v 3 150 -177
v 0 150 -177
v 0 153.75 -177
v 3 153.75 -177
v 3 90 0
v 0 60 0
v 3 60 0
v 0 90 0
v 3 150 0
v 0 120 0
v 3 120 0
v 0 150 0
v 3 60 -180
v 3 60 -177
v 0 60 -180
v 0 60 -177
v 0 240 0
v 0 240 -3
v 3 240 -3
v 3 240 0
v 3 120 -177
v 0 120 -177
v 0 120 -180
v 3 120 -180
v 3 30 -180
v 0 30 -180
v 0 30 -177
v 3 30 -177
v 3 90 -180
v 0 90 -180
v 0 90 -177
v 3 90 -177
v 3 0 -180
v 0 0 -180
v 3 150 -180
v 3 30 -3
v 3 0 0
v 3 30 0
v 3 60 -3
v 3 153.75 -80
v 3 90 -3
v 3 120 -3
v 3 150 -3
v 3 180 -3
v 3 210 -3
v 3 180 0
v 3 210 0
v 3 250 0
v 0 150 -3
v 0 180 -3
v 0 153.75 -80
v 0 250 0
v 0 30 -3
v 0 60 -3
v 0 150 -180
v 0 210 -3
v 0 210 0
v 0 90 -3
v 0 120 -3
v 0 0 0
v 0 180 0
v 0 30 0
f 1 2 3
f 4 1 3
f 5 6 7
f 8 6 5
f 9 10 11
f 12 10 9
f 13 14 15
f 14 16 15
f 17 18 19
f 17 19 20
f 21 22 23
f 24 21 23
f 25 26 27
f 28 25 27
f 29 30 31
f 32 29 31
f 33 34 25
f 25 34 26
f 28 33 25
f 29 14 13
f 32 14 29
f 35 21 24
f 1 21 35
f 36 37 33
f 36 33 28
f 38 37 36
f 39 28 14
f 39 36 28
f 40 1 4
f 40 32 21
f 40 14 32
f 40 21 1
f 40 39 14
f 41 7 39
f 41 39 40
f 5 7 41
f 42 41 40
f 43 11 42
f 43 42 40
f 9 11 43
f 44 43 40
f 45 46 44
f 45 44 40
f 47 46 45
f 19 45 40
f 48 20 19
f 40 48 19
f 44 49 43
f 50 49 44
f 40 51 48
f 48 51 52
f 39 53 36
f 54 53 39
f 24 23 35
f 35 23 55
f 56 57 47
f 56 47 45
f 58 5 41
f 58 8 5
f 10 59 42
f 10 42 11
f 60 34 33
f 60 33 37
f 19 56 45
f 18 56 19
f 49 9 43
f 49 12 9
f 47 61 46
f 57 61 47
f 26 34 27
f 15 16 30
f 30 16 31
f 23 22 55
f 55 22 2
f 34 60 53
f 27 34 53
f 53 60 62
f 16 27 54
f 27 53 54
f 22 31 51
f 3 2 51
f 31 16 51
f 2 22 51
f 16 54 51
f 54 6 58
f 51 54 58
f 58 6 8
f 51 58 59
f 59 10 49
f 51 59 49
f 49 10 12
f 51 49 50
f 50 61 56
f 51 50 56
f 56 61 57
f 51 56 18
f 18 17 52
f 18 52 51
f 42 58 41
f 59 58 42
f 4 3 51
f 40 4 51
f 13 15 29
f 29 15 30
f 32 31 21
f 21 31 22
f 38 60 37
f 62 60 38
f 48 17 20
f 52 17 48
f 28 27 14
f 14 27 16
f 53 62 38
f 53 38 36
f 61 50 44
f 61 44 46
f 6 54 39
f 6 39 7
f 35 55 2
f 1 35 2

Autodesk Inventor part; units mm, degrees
ref_plane "YZ Plane" through (0, 0, 0) normal (1, 0, 0) x (0, 1, 0)
ref_plane "XZ Plane" through (0, 0, 0) normal (0, 1, 0) x (-1, 0, 0)
ref_plane "XY Plane" through (0, 0, 0) normal (0, 0, 1) x (1, 0, 0)
sketch "Sketch2" plane through (0, 0, 0) normal (1, 0, 0) x (0, 1, 0)
  line L0 (0, -180) -> (0, 0)
  line L1 (0, 0) -> (30, 0)
  line L2 (30, 0) -> (30, -3)
  line L3 (30, -3) -> (60, -3)
  line L4 (60, -3) -> (60, 0)
  line L5 (60, 0) -> (90, 0)
  line L6 (90, 0) -> (90, -3)
  line L7 (90, -3) -> (120, -3)
  line L8 (120, -3) -> (120, 0)
  line L9 (120, 0) -> (150, 0)
  line L10 (150, 0) -> (150, -3)
  line L11 (150, -3) -> (180, -3)
  line L12 (180, -3) -> (180, 0)
  line L13 (180, 0) -> (210, 0)
  line L14 (210, 0) -> (210, -3)
  line L15 (210, -3) -> (240, -3)
  line L16 (240, -3) -> (240, 0)
  line L17 (240, 0) -> (250, 0)
  line L18 (153.75, -180) -> (153.75, -80)
  line L19 (153.75, -80) -> (250, 0)
  line L20 (0, -90) -> (37, -90) construction
  line L21 (0, -180) -> (30, -180)
  line L22 (30, -180) -> (30, -177)
  line L23 (30, -177) -> (60, -177)
  line L24 (60, -177) -> (60, -180)
  line L25 (60, -180) -> (90, -180)
  line L26 (90, -180) -> (90, -177)
  line L27 (90, -177) -> (120, -177)
  line L28 (120, -177) -> (120, -180)
  line L29 (120, -180) -> (150, -180)
  line L30 (150, -180) -> (150, -177)
  line L31 (150, -177) -> (153.75, -177)
  line L32 (153.75, -180) -> (180, -180)
  line L33 (153.75, -180) -> (0, -180)
  point P0 (180, -177)
  point P1 (210, -180)
  dimension "d25" = 180
  dimension "d26" = 250
  dimension "d27" = 30
  dimension "d28" = 3
  dimension "d29" = 30
  dimension "d30" = 3
  dimension "d31" = 30
  dimension "d32" = 3
  dimension "d33" = 30
  dimension "d34" = 3
  dimension "d35" = 30
  dimension "d36" = 3
  dimension "d37" = 30
  dimension "d38" = 3
  dimension "d39" = 30
  dimension "d40" = 3
  dimension "d41" = 30
  dimension "d42" = 3
  dimension "d43" = 10
  dimension "d47" = 203
  dimension "d51" = 100
extrude "Extrusion2" add sketch "Sketch2" along normal blind 3 contours L0 L1 L2 L3 L4 L5 L6 L7 L8 L9 L10 L11 L12 L13 L14 L15 L16 L17 L19 L18 L31 L30 L29 L28 L27 L26 L25 L24 L23 L22 L21
properties part number "Q side 1" material "ABS Plastic"
